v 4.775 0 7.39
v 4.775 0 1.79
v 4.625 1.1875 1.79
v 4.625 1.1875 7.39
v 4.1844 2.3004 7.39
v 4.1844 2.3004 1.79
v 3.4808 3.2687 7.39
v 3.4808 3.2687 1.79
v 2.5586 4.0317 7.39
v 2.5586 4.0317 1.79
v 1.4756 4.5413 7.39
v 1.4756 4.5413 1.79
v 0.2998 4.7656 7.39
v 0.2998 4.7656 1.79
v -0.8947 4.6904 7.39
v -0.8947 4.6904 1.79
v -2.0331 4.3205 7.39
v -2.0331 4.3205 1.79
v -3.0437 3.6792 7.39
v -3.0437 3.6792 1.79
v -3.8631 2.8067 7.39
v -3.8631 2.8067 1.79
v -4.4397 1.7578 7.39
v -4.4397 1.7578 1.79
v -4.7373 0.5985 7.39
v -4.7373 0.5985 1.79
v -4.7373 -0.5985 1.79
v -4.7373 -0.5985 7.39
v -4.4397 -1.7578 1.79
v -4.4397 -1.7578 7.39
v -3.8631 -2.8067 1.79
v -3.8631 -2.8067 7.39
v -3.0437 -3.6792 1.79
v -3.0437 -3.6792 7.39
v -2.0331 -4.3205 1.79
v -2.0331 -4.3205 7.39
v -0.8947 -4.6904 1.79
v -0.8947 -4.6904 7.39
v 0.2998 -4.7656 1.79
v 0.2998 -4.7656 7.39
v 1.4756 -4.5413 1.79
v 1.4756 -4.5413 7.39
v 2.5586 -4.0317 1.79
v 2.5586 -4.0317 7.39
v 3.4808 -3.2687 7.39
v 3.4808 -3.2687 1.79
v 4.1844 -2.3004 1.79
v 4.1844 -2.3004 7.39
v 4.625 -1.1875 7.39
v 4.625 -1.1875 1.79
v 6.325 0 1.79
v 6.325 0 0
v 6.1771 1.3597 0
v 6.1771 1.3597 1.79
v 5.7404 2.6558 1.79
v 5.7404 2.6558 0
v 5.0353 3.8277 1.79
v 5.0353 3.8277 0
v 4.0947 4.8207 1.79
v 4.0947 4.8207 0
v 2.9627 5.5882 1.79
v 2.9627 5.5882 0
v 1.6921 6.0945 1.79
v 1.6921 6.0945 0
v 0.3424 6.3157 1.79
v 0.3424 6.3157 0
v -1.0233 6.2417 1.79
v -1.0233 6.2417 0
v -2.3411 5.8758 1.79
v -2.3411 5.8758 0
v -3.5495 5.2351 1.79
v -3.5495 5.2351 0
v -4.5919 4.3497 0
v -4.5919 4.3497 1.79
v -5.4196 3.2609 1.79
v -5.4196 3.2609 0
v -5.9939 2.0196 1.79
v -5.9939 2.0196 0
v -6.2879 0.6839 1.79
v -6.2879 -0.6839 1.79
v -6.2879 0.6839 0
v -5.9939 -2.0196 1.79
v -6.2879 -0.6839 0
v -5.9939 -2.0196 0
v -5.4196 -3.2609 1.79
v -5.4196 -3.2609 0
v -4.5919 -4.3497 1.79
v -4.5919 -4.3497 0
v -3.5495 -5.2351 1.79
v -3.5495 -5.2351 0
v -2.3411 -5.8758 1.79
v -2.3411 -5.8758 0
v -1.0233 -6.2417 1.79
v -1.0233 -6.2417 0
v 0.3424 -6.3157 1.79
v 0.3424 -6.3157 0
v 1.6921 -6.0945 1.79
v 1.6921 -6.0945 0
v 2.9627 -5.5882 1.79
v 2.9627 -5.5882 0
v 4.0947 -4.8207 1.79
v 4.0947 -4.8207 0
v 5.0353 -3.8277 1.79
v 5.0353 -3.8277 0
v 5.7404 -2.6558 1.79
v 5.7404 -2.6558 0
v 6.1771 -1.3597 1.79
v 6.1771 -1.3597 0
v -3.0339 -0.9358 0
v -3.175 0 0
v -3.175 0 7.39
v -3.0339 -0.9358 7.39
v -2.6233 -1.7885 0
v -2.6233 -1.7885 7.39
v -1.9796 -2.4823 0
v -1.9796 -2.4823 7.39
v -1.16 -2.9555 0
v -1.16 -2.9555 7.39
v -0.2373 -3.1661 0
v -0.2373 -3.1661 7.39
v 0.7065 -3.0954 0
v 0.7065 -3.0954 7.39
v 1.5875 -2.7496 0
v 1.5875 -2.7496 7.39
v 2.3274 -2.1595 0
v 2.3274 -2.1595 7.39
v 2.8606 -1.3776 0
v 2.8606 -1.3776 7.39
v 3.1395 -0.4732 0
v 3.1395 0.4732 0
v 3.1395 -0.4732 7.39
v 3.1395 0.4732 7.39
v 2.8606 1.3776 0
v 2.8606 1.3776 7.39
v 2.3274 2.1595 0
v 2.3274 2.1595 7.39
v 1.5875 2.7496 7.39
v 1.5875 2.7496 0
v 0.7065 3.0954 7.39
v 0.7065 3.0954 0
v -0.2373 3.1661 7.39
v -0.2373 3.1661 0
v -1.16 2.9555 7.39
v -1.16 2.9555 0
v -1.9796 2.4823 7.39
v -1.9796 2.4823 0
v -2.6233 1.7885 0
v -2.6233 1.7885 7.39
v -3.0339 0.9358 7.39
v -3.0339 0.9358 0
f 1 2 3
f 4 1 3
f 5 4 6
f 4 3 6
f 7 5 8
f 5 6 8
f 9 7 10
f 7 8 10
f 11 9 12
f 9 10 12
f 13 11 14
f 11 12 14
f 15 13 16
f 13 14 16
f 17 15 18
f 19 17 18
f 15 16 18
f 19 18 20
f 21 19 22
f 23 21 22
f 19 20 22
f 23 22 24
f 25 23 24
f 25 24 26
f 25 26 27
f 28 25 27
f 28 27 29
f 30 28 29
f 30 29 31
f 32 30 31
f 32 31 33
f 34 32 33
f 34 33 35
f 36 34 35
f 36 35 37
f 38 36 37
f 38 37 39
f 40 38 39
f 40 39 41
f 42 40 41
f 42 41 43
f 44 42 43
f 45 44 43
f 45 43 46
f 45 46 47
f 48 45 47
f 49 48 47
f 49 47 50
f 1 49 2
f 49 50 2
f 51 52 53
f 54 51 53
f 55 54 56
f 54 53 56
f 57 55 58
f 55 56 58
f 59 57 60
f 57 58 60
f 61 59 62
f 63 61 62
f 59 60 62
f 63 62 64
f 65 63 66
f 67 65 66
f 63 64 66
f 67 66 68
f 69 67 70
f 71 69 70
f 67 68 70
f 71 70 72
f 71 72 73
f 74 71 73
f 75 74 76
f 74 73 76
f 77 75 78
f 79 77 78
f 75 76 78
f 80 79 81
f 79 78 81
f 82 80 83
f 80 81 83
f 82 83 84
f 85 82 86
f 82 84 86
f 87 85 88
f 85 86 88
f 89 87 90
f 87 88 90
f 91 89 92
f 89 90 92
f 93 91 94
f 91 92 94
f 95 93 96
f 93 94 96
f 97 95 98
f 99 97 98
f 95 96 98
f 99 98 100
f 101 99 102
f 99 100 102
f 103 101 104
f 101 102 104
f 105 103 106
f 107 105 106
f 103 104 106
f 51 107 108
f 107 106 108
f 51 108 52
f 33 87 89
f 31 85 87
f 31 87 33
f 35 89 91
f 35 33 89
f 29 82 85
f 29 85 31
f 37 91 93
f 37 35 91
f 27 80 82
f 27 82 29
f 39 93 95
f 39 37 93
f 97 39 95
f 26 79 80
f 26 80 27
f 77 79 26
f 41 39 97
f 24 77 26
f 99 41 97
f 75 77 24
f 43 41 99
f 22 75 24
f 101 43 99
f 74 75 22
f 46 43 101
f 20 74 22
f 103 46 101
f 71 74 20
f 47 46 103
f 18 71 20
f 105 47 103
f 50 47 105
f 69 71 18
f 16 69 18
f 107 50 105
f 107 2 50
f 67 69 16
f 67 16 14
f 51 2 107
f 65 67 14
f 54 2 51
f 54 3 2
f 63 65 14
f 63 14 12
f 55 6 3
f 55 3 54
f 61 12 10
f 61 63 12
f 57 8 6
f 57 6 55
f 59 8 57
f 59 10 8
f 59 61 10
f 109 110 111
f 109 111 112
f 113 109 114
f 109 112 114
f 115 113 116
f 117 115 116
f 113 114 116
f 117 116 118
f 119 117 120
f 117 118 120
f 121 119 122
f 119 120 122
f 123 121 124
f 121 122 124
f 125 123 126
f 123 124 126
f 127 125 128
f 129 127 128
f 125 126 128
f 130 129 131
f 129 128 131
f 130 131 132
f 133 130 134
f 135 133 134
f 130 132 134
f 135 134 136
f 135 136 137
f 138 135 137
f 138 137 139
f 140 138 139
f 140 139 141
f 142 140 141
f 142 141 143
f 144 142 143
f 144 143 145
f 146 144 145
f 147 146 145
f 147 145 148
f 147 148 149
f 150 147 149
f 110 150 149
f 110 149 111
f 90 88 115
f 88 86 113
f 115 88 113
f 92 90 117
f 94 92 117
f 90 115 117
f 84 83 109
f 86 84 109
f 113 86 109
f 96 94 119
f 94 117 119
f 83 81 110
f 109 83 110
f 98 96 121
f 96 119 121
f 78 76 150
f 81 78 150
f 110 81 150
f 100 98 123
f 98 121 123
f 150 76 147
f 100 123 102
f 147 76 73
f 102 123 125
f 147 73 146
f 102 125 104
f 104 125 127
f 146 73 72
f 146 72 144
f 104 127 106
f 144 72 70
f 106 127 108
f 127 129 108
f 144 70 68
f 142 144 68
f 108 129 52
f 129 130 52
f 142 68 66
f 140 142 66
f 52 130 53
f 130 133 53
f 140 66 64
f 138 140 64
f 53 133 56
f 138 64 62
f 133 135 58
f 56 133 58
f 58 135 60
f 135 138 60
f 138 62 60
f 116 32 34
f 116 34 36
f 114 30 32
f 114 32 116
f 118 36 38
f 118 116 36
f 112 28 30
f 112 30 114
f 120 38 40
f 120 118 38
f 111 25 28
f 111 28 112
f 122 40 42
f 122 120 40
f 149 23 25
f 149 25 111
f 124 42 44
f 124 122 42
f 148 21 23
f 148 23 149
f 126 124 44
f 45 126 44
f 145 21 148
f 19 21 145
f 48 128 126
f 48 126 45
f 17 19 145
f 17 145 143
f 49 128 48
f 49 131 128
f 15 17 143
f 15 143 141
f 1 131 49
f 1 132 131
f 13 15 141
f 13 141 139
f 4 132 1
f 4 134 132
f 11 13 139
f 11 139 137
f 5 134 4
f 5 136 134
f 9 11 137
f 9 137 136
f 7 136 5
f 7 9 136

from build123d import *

# Parameters (mm, degrees)
F0_R     = 6.325
F2_DEPTH = 1.79
F1_R     = 4.775
F3_DEPTH = 7.39
F5_D     = 6.35


with BuildPart() as f2:
    # F0 (on Top) → F2 (new body)
    with BuildSketch(Plane.XY):
        Circle(F0_R)
    extrude(amount=F2_DEPTH)

    # F1 (on Top) → F3 (join)
    with BuildSketch(Plane.XY):
        Circle(F1_R)
    extrude(amount=F3_DEPTH)

    # F5 (through all)
    with Locations(Plane(origin=(0, 0, 0), x_dir=(1, 0, 0), z_dir=(0, 0, -1))):
        with Locations((0, 0)):
            Hole(F5_D / 2)


solid = f2.part
